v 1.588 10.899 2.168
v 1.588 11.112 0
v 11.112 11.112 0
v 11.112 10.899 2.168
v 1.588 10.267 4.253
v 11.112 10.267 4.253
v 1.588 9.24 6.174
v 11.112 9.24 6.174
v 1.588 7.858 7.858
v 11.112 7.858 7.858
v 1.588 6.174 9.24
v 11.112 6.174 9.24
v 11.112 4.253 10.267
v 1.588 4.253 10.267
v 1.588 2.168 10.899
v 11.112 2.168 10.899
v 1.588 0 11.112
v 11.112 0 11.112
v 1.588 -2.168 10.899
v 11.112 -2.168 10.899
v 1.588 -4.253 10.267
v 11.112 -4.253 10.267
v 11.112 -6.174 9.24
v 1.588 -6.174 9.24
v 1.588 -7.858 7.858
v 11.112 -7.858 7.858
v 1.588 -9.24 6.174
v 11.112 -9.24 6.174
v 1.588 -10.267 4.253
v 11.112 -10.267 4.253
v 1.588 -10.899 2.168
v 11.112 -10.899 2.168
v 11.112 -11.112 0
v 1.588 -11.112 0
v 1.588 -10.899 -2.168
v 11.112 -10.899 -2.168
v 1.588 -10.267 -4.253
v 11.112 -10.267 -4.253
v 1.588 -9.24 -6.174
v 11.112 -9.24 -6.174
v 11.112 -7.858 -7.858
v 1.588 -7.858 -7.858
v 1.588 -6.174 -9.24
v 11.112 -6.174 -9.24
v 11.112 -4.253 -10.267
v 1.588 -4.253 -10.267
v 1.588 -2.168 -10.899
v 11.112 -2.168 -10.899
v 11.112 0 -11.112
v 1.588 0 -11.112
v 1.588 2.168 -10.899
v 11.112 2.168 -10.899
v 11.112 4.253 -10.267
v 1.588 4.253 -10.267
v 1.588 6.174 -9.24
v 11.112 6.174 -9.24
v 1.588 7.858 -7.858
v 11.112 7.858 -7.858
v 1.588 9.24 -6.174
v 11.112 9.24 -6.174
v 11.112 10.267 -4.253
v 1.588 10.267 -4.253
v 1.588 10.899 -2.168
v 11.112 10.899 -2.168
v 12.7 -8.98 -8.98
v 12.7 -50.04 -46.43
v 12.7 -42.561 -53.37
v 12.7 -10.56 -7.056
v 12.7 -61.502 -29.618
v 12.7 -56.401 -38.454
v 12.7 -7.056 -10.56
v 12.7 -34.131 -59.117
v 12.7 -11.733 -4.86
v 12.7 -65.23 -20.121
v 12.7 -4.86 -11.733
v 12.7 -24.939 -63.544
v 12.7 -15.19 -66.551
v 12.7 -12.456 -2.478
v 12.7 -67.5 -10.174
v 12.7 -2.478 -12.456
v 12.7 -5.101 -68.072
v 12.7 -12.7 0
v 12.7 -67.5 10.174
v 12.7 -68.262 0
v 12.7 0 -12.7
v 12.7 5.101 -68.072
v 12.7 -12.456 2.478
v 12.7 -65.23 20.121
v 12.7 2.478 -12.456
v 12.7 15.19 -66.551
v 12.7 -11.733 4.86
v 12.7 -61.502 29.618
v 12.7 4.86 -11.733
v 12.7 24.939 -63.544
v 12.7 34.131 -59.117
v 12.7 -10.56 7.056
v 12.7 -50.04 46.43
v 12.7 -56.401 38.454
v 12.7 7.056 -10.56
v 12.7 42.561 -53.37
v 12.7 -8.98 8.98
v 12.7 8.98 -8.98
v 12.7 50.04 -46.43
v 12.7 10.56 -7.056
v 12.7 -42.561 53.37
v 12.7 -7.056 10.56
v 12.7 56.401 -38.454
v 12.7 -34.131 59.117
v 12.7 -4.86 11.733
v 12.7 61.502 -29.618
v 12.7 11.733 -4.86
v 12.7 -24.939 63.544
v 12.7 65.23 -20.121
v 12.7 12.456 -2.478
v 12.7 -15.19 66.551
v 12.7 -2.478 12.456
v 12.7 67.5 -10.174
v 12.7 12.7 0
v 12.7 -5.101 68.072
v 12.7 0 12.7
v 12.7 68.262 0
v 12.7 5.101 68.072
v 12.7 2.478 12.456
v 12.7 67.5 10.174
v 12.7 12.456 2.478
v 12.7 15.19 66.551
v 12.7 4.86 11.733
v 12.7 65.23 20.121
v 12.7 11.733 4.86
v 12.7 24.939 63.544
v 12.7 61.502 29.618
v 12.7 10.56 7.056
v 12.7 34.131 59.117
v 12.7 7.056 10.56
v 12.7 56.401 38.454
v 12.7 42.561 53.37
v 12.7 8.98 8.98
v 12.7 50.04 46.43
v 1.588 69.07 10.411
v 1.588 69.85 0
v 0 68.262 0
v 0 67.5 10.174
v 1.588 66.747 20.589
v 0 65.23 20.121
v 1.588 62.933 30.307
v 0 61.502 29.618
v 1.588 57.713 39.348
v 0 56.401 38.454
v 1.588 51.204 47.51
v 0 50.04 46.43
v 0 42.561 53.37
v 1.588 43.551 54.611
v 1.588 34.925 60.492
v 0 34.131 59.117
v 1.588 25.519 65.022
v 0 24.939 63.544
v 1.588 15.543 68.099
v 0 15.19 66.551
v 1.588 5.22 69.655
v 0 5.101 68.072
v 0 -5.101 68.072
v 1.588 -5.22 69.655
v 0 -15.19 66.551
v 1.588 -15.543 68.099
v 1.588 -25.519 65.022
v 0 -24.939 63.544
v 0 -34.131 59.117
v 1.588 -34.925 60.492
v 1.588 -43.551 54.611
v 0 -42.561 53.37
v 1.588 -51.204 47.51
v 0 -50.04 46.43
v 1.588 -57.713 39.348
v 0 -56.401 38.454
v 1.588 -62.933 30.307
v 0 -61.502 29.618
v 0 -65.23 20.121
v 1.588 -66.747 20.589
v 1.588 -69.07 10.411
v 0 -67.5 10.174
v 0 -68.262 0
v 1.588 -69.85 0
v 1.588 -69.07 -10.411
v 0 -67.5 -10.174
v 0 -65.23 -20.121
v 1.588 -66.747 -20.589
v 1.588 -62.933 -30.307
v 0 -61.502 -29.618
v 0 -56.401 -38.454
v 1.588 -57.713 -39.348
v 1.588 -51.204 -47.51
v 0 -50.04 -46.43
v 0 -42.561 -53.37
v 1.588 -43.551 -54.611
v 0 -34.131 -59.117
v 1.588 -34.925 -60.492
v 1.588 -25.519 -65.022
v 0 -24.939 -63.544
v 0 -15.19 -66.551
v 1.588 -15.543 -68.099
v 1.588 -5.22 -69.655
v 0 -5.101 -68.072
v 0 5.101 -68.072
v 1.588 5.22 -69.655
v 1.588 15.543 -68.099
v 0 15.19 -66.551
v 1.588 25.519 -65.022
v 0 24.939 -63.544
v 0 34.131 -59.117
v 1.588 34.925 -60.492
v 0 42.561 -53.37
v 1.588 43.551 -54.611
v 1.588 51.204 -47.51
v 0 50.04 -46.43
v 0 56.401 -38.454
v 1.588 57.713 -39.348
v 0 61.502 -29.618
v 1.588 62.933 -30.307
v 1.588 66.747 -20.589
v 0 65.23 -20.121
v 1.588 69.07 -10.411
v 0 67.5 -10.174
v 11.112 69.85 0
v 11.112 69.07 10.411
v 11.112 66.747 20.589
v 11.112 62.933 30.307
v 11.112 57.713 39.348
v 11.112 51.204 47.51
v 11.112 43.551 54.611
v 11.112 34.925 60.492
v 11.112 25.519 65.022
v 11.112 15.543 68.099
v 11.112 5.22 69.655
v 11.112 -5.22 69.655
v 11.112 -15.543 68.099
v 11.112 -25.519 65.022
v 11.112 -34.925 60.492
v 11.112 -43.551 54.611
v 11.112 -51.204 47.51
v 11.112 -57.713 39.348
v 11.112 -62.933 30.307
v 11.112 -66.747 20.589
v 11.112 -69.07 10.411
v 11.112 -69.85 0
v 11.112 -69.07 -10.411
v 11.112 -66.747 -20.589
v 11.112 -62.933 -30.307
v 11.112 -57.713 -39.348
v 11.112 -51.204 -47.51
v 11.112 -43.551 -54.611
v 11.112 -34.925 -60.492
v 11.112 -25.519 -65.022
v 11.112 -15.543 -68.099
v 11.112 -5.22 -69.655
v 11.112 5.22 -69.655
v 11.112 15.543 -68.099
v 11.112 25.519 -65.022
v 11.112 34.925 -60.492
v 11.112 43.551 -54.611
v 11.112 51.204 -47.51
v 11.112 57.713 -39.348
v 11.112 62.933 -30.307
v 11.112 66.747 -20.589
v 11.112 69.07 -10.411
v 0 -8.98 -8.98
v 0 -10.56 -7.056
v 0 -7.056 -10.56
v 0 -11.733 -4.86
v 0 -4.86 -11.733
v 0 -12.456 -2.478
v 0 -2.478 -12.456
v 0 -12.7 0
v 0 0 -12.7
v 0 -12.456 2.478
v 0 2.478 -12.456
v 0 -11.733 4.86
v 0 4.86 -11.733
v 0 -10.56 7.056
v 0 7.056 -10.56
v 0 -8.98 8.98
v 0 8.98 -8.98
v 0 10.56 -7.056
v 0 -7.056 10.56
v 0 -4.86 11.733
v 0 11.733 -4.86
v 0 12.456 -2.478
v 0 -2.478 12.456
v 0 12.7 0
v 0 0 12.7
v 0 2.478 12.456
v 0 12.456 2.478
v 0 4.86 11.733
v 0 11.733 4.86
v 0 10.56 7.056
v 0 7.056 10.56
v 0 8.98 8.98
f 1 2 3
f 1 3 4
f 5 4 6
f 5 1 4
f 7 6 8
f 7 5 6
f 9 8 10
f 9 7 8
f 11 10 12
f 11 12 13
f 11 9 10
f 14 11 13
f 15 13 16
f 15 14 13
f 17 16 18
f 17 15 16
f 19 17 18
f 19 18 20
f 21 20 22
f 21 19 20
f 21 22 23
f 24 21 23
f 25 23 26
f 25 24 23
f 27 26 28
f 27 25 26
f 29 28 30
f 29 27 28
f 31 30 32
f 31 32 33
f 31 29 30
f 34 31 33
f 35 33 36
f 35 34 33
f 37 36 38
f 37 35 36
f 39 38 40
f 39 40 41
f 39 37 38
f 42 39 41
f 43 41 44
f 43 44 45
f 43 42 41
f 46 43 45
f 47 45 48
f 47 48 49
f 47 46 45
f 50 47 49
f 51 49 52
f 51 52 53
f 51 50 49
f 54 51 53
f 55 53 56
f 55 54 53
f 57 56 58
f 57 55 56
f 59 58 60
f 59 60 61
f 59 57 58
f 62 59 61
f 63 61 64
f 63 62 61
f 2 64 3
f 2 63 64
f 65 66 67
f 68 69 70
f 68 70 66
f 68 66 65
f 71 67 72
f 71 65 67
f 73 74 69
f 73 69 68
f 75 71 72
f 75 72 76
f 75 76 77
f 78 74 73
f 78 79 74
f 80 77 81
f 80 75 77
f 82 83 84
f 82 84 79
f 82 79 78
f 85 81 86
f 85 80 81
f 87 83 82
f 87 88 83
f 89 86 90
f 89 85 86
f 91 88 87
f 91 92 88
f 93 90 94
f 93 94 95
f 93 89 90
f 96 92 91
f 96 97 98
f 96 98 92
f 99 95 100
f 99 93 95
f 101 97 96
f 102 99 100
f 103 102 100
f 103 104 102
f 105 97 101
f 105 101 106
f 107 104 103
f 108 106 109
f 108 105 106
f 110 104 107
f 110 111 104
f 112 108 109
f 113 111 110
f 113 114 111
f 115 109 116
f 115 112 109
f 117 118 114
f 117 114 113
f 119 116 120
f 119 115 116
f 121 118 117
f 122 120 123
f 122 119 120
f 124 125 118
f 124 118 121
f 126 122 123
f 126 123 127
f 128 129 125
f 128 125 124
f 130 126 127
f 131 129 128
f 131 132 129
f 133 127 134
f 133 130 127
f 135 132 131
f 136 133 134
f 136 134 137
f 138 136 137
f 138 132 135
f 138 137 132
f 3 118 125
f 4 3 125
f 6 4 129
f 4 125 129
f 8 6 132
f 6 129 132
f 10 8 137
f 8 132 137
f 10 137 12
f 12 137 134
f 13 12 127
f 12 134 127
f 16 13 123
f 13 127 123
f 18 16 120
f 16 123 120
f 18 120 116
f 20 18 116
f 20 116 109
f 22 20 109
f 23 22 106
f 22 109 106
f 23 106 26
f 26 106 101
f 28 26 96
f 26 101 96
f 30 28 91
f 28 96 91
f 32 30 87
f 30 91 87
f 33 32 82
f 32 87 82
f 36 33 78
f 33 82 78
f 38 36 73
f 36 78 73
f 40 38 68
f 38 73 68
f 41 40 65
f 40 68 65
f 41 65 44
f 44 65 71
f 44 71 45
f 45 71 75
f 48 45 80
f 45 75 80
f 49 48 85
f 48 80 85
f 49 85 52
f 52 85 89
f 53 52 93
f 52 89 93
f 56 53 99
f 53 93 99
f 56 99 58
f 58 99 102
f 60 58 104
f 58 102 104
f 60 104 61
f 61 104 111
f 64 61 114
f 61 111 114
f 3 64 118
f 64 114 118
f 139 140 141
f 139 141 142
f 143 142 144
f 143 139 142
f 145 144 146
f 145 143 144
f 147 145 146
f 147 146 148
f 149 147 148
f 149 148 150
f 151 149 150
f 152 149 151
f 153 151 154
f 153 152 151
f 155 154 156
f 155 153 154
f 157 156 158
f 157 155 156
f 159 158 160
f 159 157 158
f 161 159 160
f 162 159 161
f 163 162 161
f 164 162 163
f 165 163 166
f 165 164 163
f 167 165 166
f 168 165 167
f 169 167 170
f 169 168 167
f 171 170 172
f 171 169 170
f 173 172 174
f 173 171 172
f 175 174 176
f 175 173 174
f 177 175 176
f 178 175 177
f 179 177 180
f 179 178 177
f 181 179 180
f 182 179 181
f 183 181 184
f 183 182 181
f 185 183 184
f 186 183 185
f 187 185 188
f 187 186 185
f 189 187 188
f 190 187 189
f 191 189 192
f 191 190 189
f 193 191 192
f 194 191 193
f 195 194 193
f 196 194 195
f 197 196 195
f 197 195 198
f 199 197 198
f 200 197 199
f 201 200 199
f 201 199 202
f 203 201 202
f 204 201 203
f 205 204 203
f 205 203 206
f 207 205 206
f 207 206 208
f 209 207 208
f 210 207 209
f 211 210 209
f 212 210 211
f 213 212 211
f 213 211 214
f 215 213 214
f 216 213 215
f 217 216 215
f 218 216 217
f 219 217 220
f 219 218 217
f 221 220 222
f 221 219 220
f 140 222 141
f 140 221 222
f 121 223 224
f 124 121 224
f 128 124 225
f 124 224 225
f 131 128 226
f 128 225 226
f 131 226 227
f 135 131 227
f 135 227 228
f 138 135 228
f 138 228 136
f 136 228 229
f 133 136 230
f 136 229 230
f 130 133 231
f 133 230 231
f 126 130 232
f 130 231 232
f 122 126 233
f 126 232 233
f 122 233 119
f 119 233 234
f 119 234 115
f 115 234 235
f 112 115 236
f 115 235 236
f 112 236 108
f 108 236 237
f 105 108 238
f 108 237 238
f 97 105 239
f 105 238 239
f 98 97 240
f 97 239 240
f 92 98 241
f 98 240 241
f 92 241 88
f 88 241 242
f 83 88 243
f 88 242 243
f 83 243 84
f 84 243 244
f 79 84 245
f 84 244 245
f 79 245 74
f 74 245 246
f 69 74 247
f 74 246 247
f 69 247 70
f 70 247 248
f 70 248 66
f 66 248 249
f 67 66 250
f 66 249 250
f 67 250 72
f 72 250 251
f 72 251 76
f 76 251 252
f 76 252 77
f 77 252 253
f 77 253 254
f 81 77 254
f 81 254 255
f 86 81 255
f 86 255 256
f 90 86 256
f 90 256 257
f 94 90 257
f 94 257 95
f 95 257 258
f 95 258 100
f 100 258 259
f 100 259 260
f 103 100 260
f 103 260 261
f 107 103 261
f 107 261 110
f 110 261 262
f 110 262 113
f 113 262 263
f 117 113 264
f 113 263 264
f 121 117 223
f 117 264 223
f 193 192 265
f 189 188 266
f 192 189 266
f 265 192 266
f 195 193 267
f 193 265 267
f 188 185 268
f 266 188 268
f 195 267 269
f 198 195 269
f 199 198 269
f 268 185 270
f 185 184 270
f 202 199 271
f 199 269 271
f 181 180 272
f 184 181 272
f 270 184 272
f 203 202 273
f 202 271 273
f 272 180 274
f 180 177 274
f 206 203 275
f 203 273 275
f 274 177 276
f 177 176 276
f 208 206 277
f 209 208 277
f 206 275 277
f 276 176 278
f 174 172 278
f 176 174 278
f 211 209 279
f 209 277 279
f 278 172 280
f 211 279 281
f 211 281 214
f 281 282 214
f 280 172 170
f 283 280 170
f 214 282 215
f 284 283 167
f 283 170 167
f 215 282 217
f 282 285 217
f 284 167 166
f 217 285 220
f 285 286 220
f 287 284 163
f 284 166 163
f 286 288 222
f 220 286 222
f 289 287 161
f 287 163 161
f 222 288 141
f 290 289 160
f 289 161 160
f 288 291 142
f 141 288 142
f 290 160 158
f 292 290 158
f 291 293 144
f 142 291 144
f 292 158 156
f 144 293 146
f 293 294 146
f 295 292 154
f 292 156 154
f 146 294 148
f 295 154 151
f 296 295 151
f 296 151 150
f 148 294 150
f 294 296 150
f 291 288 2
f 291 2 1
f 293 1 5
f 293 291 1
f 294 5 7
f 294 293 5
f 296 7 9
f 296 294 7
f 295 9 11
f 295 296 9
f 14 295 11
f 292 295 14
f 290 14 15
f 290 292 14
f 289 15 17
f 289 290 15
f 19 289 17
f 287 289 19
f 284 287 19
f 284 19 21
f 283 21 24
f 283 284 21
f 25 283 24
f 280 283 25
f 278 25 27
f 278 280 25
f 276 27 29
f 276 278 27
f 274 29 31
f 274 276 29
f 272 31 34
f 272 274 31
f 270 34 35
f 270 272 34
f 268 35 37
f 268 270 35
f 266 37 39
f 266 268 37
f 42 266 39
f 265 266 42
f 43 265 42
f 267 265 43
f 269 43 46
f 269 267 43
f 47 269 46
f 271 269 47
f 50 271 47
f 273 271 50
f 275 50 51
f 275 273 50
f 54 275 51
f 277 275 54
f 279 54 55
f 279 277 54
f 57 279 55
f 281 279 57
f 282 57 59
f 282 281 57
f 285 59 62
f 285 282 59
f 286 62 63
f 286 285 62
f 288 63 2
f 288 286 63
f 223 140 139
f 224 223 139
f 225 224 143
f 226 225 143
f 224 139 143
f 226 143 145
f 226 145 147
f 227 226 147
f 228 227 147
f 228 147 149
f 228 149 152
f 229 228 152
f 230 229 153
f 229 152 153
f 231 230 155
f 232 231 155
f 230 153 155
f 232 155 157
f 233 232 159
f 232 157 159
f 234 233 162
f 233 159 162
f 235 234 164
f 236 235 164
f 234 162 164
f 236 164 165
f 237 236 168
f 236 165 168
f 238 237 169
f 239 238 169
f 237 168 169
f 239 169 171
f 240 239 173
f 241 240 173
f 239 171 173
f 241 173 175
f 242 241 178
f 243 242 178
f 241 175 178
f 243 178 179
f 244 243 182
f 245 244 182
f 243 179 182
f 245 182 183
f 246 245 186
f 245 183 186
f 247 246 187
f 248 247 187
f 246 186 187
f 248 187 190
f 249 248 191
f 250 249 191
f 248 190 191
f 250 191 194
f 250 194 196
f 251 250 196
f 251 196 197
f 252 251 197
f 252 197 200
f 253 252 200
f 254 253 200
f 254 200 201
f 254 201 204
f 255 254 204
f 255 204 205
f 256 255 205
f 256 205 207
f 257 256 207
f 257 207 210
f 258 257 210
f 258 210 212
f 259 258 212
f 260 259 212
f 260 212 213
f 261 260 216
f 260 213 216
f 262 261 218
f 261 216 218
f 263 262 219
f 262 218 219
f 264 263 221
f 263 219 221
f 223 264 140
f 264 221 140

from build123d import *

# Parameters (mm, degrees)
F0_R     = 69.85
F0_R_2   = 11.1125
F1_DEPTH = 12.7
F2_SIZE  = 1.5875
F3_SIZE  = 1.5875


with BuildPart() as f1:
    # F0 (on Right) → F1 (new body)
    with BuildSketch(Plane.YZ):
        Circle(F0_R)
        Circle(F0_R_2, mode=Mode.SUBTRACT)
    extrude(amount=F1_DEPTH)

    # F2
    f2_edges = [f1.edges().sort_by_distance(p)[0] for p in [
        (0, -11.1125, 0),
        (12.7, -11.1125, 0),
    ]]
    chamfer(f2_edges, length=F2_SIZE)

    # F3
    f3_edges = [f1.edges().sort_by_distance(p)[0] for p in [
        (0, -69.85, 0),
        (12.7, -69.85, 0),
    ]]
    chamfer(f3_edges, length=F3_SIZE)


solid = f1.part
